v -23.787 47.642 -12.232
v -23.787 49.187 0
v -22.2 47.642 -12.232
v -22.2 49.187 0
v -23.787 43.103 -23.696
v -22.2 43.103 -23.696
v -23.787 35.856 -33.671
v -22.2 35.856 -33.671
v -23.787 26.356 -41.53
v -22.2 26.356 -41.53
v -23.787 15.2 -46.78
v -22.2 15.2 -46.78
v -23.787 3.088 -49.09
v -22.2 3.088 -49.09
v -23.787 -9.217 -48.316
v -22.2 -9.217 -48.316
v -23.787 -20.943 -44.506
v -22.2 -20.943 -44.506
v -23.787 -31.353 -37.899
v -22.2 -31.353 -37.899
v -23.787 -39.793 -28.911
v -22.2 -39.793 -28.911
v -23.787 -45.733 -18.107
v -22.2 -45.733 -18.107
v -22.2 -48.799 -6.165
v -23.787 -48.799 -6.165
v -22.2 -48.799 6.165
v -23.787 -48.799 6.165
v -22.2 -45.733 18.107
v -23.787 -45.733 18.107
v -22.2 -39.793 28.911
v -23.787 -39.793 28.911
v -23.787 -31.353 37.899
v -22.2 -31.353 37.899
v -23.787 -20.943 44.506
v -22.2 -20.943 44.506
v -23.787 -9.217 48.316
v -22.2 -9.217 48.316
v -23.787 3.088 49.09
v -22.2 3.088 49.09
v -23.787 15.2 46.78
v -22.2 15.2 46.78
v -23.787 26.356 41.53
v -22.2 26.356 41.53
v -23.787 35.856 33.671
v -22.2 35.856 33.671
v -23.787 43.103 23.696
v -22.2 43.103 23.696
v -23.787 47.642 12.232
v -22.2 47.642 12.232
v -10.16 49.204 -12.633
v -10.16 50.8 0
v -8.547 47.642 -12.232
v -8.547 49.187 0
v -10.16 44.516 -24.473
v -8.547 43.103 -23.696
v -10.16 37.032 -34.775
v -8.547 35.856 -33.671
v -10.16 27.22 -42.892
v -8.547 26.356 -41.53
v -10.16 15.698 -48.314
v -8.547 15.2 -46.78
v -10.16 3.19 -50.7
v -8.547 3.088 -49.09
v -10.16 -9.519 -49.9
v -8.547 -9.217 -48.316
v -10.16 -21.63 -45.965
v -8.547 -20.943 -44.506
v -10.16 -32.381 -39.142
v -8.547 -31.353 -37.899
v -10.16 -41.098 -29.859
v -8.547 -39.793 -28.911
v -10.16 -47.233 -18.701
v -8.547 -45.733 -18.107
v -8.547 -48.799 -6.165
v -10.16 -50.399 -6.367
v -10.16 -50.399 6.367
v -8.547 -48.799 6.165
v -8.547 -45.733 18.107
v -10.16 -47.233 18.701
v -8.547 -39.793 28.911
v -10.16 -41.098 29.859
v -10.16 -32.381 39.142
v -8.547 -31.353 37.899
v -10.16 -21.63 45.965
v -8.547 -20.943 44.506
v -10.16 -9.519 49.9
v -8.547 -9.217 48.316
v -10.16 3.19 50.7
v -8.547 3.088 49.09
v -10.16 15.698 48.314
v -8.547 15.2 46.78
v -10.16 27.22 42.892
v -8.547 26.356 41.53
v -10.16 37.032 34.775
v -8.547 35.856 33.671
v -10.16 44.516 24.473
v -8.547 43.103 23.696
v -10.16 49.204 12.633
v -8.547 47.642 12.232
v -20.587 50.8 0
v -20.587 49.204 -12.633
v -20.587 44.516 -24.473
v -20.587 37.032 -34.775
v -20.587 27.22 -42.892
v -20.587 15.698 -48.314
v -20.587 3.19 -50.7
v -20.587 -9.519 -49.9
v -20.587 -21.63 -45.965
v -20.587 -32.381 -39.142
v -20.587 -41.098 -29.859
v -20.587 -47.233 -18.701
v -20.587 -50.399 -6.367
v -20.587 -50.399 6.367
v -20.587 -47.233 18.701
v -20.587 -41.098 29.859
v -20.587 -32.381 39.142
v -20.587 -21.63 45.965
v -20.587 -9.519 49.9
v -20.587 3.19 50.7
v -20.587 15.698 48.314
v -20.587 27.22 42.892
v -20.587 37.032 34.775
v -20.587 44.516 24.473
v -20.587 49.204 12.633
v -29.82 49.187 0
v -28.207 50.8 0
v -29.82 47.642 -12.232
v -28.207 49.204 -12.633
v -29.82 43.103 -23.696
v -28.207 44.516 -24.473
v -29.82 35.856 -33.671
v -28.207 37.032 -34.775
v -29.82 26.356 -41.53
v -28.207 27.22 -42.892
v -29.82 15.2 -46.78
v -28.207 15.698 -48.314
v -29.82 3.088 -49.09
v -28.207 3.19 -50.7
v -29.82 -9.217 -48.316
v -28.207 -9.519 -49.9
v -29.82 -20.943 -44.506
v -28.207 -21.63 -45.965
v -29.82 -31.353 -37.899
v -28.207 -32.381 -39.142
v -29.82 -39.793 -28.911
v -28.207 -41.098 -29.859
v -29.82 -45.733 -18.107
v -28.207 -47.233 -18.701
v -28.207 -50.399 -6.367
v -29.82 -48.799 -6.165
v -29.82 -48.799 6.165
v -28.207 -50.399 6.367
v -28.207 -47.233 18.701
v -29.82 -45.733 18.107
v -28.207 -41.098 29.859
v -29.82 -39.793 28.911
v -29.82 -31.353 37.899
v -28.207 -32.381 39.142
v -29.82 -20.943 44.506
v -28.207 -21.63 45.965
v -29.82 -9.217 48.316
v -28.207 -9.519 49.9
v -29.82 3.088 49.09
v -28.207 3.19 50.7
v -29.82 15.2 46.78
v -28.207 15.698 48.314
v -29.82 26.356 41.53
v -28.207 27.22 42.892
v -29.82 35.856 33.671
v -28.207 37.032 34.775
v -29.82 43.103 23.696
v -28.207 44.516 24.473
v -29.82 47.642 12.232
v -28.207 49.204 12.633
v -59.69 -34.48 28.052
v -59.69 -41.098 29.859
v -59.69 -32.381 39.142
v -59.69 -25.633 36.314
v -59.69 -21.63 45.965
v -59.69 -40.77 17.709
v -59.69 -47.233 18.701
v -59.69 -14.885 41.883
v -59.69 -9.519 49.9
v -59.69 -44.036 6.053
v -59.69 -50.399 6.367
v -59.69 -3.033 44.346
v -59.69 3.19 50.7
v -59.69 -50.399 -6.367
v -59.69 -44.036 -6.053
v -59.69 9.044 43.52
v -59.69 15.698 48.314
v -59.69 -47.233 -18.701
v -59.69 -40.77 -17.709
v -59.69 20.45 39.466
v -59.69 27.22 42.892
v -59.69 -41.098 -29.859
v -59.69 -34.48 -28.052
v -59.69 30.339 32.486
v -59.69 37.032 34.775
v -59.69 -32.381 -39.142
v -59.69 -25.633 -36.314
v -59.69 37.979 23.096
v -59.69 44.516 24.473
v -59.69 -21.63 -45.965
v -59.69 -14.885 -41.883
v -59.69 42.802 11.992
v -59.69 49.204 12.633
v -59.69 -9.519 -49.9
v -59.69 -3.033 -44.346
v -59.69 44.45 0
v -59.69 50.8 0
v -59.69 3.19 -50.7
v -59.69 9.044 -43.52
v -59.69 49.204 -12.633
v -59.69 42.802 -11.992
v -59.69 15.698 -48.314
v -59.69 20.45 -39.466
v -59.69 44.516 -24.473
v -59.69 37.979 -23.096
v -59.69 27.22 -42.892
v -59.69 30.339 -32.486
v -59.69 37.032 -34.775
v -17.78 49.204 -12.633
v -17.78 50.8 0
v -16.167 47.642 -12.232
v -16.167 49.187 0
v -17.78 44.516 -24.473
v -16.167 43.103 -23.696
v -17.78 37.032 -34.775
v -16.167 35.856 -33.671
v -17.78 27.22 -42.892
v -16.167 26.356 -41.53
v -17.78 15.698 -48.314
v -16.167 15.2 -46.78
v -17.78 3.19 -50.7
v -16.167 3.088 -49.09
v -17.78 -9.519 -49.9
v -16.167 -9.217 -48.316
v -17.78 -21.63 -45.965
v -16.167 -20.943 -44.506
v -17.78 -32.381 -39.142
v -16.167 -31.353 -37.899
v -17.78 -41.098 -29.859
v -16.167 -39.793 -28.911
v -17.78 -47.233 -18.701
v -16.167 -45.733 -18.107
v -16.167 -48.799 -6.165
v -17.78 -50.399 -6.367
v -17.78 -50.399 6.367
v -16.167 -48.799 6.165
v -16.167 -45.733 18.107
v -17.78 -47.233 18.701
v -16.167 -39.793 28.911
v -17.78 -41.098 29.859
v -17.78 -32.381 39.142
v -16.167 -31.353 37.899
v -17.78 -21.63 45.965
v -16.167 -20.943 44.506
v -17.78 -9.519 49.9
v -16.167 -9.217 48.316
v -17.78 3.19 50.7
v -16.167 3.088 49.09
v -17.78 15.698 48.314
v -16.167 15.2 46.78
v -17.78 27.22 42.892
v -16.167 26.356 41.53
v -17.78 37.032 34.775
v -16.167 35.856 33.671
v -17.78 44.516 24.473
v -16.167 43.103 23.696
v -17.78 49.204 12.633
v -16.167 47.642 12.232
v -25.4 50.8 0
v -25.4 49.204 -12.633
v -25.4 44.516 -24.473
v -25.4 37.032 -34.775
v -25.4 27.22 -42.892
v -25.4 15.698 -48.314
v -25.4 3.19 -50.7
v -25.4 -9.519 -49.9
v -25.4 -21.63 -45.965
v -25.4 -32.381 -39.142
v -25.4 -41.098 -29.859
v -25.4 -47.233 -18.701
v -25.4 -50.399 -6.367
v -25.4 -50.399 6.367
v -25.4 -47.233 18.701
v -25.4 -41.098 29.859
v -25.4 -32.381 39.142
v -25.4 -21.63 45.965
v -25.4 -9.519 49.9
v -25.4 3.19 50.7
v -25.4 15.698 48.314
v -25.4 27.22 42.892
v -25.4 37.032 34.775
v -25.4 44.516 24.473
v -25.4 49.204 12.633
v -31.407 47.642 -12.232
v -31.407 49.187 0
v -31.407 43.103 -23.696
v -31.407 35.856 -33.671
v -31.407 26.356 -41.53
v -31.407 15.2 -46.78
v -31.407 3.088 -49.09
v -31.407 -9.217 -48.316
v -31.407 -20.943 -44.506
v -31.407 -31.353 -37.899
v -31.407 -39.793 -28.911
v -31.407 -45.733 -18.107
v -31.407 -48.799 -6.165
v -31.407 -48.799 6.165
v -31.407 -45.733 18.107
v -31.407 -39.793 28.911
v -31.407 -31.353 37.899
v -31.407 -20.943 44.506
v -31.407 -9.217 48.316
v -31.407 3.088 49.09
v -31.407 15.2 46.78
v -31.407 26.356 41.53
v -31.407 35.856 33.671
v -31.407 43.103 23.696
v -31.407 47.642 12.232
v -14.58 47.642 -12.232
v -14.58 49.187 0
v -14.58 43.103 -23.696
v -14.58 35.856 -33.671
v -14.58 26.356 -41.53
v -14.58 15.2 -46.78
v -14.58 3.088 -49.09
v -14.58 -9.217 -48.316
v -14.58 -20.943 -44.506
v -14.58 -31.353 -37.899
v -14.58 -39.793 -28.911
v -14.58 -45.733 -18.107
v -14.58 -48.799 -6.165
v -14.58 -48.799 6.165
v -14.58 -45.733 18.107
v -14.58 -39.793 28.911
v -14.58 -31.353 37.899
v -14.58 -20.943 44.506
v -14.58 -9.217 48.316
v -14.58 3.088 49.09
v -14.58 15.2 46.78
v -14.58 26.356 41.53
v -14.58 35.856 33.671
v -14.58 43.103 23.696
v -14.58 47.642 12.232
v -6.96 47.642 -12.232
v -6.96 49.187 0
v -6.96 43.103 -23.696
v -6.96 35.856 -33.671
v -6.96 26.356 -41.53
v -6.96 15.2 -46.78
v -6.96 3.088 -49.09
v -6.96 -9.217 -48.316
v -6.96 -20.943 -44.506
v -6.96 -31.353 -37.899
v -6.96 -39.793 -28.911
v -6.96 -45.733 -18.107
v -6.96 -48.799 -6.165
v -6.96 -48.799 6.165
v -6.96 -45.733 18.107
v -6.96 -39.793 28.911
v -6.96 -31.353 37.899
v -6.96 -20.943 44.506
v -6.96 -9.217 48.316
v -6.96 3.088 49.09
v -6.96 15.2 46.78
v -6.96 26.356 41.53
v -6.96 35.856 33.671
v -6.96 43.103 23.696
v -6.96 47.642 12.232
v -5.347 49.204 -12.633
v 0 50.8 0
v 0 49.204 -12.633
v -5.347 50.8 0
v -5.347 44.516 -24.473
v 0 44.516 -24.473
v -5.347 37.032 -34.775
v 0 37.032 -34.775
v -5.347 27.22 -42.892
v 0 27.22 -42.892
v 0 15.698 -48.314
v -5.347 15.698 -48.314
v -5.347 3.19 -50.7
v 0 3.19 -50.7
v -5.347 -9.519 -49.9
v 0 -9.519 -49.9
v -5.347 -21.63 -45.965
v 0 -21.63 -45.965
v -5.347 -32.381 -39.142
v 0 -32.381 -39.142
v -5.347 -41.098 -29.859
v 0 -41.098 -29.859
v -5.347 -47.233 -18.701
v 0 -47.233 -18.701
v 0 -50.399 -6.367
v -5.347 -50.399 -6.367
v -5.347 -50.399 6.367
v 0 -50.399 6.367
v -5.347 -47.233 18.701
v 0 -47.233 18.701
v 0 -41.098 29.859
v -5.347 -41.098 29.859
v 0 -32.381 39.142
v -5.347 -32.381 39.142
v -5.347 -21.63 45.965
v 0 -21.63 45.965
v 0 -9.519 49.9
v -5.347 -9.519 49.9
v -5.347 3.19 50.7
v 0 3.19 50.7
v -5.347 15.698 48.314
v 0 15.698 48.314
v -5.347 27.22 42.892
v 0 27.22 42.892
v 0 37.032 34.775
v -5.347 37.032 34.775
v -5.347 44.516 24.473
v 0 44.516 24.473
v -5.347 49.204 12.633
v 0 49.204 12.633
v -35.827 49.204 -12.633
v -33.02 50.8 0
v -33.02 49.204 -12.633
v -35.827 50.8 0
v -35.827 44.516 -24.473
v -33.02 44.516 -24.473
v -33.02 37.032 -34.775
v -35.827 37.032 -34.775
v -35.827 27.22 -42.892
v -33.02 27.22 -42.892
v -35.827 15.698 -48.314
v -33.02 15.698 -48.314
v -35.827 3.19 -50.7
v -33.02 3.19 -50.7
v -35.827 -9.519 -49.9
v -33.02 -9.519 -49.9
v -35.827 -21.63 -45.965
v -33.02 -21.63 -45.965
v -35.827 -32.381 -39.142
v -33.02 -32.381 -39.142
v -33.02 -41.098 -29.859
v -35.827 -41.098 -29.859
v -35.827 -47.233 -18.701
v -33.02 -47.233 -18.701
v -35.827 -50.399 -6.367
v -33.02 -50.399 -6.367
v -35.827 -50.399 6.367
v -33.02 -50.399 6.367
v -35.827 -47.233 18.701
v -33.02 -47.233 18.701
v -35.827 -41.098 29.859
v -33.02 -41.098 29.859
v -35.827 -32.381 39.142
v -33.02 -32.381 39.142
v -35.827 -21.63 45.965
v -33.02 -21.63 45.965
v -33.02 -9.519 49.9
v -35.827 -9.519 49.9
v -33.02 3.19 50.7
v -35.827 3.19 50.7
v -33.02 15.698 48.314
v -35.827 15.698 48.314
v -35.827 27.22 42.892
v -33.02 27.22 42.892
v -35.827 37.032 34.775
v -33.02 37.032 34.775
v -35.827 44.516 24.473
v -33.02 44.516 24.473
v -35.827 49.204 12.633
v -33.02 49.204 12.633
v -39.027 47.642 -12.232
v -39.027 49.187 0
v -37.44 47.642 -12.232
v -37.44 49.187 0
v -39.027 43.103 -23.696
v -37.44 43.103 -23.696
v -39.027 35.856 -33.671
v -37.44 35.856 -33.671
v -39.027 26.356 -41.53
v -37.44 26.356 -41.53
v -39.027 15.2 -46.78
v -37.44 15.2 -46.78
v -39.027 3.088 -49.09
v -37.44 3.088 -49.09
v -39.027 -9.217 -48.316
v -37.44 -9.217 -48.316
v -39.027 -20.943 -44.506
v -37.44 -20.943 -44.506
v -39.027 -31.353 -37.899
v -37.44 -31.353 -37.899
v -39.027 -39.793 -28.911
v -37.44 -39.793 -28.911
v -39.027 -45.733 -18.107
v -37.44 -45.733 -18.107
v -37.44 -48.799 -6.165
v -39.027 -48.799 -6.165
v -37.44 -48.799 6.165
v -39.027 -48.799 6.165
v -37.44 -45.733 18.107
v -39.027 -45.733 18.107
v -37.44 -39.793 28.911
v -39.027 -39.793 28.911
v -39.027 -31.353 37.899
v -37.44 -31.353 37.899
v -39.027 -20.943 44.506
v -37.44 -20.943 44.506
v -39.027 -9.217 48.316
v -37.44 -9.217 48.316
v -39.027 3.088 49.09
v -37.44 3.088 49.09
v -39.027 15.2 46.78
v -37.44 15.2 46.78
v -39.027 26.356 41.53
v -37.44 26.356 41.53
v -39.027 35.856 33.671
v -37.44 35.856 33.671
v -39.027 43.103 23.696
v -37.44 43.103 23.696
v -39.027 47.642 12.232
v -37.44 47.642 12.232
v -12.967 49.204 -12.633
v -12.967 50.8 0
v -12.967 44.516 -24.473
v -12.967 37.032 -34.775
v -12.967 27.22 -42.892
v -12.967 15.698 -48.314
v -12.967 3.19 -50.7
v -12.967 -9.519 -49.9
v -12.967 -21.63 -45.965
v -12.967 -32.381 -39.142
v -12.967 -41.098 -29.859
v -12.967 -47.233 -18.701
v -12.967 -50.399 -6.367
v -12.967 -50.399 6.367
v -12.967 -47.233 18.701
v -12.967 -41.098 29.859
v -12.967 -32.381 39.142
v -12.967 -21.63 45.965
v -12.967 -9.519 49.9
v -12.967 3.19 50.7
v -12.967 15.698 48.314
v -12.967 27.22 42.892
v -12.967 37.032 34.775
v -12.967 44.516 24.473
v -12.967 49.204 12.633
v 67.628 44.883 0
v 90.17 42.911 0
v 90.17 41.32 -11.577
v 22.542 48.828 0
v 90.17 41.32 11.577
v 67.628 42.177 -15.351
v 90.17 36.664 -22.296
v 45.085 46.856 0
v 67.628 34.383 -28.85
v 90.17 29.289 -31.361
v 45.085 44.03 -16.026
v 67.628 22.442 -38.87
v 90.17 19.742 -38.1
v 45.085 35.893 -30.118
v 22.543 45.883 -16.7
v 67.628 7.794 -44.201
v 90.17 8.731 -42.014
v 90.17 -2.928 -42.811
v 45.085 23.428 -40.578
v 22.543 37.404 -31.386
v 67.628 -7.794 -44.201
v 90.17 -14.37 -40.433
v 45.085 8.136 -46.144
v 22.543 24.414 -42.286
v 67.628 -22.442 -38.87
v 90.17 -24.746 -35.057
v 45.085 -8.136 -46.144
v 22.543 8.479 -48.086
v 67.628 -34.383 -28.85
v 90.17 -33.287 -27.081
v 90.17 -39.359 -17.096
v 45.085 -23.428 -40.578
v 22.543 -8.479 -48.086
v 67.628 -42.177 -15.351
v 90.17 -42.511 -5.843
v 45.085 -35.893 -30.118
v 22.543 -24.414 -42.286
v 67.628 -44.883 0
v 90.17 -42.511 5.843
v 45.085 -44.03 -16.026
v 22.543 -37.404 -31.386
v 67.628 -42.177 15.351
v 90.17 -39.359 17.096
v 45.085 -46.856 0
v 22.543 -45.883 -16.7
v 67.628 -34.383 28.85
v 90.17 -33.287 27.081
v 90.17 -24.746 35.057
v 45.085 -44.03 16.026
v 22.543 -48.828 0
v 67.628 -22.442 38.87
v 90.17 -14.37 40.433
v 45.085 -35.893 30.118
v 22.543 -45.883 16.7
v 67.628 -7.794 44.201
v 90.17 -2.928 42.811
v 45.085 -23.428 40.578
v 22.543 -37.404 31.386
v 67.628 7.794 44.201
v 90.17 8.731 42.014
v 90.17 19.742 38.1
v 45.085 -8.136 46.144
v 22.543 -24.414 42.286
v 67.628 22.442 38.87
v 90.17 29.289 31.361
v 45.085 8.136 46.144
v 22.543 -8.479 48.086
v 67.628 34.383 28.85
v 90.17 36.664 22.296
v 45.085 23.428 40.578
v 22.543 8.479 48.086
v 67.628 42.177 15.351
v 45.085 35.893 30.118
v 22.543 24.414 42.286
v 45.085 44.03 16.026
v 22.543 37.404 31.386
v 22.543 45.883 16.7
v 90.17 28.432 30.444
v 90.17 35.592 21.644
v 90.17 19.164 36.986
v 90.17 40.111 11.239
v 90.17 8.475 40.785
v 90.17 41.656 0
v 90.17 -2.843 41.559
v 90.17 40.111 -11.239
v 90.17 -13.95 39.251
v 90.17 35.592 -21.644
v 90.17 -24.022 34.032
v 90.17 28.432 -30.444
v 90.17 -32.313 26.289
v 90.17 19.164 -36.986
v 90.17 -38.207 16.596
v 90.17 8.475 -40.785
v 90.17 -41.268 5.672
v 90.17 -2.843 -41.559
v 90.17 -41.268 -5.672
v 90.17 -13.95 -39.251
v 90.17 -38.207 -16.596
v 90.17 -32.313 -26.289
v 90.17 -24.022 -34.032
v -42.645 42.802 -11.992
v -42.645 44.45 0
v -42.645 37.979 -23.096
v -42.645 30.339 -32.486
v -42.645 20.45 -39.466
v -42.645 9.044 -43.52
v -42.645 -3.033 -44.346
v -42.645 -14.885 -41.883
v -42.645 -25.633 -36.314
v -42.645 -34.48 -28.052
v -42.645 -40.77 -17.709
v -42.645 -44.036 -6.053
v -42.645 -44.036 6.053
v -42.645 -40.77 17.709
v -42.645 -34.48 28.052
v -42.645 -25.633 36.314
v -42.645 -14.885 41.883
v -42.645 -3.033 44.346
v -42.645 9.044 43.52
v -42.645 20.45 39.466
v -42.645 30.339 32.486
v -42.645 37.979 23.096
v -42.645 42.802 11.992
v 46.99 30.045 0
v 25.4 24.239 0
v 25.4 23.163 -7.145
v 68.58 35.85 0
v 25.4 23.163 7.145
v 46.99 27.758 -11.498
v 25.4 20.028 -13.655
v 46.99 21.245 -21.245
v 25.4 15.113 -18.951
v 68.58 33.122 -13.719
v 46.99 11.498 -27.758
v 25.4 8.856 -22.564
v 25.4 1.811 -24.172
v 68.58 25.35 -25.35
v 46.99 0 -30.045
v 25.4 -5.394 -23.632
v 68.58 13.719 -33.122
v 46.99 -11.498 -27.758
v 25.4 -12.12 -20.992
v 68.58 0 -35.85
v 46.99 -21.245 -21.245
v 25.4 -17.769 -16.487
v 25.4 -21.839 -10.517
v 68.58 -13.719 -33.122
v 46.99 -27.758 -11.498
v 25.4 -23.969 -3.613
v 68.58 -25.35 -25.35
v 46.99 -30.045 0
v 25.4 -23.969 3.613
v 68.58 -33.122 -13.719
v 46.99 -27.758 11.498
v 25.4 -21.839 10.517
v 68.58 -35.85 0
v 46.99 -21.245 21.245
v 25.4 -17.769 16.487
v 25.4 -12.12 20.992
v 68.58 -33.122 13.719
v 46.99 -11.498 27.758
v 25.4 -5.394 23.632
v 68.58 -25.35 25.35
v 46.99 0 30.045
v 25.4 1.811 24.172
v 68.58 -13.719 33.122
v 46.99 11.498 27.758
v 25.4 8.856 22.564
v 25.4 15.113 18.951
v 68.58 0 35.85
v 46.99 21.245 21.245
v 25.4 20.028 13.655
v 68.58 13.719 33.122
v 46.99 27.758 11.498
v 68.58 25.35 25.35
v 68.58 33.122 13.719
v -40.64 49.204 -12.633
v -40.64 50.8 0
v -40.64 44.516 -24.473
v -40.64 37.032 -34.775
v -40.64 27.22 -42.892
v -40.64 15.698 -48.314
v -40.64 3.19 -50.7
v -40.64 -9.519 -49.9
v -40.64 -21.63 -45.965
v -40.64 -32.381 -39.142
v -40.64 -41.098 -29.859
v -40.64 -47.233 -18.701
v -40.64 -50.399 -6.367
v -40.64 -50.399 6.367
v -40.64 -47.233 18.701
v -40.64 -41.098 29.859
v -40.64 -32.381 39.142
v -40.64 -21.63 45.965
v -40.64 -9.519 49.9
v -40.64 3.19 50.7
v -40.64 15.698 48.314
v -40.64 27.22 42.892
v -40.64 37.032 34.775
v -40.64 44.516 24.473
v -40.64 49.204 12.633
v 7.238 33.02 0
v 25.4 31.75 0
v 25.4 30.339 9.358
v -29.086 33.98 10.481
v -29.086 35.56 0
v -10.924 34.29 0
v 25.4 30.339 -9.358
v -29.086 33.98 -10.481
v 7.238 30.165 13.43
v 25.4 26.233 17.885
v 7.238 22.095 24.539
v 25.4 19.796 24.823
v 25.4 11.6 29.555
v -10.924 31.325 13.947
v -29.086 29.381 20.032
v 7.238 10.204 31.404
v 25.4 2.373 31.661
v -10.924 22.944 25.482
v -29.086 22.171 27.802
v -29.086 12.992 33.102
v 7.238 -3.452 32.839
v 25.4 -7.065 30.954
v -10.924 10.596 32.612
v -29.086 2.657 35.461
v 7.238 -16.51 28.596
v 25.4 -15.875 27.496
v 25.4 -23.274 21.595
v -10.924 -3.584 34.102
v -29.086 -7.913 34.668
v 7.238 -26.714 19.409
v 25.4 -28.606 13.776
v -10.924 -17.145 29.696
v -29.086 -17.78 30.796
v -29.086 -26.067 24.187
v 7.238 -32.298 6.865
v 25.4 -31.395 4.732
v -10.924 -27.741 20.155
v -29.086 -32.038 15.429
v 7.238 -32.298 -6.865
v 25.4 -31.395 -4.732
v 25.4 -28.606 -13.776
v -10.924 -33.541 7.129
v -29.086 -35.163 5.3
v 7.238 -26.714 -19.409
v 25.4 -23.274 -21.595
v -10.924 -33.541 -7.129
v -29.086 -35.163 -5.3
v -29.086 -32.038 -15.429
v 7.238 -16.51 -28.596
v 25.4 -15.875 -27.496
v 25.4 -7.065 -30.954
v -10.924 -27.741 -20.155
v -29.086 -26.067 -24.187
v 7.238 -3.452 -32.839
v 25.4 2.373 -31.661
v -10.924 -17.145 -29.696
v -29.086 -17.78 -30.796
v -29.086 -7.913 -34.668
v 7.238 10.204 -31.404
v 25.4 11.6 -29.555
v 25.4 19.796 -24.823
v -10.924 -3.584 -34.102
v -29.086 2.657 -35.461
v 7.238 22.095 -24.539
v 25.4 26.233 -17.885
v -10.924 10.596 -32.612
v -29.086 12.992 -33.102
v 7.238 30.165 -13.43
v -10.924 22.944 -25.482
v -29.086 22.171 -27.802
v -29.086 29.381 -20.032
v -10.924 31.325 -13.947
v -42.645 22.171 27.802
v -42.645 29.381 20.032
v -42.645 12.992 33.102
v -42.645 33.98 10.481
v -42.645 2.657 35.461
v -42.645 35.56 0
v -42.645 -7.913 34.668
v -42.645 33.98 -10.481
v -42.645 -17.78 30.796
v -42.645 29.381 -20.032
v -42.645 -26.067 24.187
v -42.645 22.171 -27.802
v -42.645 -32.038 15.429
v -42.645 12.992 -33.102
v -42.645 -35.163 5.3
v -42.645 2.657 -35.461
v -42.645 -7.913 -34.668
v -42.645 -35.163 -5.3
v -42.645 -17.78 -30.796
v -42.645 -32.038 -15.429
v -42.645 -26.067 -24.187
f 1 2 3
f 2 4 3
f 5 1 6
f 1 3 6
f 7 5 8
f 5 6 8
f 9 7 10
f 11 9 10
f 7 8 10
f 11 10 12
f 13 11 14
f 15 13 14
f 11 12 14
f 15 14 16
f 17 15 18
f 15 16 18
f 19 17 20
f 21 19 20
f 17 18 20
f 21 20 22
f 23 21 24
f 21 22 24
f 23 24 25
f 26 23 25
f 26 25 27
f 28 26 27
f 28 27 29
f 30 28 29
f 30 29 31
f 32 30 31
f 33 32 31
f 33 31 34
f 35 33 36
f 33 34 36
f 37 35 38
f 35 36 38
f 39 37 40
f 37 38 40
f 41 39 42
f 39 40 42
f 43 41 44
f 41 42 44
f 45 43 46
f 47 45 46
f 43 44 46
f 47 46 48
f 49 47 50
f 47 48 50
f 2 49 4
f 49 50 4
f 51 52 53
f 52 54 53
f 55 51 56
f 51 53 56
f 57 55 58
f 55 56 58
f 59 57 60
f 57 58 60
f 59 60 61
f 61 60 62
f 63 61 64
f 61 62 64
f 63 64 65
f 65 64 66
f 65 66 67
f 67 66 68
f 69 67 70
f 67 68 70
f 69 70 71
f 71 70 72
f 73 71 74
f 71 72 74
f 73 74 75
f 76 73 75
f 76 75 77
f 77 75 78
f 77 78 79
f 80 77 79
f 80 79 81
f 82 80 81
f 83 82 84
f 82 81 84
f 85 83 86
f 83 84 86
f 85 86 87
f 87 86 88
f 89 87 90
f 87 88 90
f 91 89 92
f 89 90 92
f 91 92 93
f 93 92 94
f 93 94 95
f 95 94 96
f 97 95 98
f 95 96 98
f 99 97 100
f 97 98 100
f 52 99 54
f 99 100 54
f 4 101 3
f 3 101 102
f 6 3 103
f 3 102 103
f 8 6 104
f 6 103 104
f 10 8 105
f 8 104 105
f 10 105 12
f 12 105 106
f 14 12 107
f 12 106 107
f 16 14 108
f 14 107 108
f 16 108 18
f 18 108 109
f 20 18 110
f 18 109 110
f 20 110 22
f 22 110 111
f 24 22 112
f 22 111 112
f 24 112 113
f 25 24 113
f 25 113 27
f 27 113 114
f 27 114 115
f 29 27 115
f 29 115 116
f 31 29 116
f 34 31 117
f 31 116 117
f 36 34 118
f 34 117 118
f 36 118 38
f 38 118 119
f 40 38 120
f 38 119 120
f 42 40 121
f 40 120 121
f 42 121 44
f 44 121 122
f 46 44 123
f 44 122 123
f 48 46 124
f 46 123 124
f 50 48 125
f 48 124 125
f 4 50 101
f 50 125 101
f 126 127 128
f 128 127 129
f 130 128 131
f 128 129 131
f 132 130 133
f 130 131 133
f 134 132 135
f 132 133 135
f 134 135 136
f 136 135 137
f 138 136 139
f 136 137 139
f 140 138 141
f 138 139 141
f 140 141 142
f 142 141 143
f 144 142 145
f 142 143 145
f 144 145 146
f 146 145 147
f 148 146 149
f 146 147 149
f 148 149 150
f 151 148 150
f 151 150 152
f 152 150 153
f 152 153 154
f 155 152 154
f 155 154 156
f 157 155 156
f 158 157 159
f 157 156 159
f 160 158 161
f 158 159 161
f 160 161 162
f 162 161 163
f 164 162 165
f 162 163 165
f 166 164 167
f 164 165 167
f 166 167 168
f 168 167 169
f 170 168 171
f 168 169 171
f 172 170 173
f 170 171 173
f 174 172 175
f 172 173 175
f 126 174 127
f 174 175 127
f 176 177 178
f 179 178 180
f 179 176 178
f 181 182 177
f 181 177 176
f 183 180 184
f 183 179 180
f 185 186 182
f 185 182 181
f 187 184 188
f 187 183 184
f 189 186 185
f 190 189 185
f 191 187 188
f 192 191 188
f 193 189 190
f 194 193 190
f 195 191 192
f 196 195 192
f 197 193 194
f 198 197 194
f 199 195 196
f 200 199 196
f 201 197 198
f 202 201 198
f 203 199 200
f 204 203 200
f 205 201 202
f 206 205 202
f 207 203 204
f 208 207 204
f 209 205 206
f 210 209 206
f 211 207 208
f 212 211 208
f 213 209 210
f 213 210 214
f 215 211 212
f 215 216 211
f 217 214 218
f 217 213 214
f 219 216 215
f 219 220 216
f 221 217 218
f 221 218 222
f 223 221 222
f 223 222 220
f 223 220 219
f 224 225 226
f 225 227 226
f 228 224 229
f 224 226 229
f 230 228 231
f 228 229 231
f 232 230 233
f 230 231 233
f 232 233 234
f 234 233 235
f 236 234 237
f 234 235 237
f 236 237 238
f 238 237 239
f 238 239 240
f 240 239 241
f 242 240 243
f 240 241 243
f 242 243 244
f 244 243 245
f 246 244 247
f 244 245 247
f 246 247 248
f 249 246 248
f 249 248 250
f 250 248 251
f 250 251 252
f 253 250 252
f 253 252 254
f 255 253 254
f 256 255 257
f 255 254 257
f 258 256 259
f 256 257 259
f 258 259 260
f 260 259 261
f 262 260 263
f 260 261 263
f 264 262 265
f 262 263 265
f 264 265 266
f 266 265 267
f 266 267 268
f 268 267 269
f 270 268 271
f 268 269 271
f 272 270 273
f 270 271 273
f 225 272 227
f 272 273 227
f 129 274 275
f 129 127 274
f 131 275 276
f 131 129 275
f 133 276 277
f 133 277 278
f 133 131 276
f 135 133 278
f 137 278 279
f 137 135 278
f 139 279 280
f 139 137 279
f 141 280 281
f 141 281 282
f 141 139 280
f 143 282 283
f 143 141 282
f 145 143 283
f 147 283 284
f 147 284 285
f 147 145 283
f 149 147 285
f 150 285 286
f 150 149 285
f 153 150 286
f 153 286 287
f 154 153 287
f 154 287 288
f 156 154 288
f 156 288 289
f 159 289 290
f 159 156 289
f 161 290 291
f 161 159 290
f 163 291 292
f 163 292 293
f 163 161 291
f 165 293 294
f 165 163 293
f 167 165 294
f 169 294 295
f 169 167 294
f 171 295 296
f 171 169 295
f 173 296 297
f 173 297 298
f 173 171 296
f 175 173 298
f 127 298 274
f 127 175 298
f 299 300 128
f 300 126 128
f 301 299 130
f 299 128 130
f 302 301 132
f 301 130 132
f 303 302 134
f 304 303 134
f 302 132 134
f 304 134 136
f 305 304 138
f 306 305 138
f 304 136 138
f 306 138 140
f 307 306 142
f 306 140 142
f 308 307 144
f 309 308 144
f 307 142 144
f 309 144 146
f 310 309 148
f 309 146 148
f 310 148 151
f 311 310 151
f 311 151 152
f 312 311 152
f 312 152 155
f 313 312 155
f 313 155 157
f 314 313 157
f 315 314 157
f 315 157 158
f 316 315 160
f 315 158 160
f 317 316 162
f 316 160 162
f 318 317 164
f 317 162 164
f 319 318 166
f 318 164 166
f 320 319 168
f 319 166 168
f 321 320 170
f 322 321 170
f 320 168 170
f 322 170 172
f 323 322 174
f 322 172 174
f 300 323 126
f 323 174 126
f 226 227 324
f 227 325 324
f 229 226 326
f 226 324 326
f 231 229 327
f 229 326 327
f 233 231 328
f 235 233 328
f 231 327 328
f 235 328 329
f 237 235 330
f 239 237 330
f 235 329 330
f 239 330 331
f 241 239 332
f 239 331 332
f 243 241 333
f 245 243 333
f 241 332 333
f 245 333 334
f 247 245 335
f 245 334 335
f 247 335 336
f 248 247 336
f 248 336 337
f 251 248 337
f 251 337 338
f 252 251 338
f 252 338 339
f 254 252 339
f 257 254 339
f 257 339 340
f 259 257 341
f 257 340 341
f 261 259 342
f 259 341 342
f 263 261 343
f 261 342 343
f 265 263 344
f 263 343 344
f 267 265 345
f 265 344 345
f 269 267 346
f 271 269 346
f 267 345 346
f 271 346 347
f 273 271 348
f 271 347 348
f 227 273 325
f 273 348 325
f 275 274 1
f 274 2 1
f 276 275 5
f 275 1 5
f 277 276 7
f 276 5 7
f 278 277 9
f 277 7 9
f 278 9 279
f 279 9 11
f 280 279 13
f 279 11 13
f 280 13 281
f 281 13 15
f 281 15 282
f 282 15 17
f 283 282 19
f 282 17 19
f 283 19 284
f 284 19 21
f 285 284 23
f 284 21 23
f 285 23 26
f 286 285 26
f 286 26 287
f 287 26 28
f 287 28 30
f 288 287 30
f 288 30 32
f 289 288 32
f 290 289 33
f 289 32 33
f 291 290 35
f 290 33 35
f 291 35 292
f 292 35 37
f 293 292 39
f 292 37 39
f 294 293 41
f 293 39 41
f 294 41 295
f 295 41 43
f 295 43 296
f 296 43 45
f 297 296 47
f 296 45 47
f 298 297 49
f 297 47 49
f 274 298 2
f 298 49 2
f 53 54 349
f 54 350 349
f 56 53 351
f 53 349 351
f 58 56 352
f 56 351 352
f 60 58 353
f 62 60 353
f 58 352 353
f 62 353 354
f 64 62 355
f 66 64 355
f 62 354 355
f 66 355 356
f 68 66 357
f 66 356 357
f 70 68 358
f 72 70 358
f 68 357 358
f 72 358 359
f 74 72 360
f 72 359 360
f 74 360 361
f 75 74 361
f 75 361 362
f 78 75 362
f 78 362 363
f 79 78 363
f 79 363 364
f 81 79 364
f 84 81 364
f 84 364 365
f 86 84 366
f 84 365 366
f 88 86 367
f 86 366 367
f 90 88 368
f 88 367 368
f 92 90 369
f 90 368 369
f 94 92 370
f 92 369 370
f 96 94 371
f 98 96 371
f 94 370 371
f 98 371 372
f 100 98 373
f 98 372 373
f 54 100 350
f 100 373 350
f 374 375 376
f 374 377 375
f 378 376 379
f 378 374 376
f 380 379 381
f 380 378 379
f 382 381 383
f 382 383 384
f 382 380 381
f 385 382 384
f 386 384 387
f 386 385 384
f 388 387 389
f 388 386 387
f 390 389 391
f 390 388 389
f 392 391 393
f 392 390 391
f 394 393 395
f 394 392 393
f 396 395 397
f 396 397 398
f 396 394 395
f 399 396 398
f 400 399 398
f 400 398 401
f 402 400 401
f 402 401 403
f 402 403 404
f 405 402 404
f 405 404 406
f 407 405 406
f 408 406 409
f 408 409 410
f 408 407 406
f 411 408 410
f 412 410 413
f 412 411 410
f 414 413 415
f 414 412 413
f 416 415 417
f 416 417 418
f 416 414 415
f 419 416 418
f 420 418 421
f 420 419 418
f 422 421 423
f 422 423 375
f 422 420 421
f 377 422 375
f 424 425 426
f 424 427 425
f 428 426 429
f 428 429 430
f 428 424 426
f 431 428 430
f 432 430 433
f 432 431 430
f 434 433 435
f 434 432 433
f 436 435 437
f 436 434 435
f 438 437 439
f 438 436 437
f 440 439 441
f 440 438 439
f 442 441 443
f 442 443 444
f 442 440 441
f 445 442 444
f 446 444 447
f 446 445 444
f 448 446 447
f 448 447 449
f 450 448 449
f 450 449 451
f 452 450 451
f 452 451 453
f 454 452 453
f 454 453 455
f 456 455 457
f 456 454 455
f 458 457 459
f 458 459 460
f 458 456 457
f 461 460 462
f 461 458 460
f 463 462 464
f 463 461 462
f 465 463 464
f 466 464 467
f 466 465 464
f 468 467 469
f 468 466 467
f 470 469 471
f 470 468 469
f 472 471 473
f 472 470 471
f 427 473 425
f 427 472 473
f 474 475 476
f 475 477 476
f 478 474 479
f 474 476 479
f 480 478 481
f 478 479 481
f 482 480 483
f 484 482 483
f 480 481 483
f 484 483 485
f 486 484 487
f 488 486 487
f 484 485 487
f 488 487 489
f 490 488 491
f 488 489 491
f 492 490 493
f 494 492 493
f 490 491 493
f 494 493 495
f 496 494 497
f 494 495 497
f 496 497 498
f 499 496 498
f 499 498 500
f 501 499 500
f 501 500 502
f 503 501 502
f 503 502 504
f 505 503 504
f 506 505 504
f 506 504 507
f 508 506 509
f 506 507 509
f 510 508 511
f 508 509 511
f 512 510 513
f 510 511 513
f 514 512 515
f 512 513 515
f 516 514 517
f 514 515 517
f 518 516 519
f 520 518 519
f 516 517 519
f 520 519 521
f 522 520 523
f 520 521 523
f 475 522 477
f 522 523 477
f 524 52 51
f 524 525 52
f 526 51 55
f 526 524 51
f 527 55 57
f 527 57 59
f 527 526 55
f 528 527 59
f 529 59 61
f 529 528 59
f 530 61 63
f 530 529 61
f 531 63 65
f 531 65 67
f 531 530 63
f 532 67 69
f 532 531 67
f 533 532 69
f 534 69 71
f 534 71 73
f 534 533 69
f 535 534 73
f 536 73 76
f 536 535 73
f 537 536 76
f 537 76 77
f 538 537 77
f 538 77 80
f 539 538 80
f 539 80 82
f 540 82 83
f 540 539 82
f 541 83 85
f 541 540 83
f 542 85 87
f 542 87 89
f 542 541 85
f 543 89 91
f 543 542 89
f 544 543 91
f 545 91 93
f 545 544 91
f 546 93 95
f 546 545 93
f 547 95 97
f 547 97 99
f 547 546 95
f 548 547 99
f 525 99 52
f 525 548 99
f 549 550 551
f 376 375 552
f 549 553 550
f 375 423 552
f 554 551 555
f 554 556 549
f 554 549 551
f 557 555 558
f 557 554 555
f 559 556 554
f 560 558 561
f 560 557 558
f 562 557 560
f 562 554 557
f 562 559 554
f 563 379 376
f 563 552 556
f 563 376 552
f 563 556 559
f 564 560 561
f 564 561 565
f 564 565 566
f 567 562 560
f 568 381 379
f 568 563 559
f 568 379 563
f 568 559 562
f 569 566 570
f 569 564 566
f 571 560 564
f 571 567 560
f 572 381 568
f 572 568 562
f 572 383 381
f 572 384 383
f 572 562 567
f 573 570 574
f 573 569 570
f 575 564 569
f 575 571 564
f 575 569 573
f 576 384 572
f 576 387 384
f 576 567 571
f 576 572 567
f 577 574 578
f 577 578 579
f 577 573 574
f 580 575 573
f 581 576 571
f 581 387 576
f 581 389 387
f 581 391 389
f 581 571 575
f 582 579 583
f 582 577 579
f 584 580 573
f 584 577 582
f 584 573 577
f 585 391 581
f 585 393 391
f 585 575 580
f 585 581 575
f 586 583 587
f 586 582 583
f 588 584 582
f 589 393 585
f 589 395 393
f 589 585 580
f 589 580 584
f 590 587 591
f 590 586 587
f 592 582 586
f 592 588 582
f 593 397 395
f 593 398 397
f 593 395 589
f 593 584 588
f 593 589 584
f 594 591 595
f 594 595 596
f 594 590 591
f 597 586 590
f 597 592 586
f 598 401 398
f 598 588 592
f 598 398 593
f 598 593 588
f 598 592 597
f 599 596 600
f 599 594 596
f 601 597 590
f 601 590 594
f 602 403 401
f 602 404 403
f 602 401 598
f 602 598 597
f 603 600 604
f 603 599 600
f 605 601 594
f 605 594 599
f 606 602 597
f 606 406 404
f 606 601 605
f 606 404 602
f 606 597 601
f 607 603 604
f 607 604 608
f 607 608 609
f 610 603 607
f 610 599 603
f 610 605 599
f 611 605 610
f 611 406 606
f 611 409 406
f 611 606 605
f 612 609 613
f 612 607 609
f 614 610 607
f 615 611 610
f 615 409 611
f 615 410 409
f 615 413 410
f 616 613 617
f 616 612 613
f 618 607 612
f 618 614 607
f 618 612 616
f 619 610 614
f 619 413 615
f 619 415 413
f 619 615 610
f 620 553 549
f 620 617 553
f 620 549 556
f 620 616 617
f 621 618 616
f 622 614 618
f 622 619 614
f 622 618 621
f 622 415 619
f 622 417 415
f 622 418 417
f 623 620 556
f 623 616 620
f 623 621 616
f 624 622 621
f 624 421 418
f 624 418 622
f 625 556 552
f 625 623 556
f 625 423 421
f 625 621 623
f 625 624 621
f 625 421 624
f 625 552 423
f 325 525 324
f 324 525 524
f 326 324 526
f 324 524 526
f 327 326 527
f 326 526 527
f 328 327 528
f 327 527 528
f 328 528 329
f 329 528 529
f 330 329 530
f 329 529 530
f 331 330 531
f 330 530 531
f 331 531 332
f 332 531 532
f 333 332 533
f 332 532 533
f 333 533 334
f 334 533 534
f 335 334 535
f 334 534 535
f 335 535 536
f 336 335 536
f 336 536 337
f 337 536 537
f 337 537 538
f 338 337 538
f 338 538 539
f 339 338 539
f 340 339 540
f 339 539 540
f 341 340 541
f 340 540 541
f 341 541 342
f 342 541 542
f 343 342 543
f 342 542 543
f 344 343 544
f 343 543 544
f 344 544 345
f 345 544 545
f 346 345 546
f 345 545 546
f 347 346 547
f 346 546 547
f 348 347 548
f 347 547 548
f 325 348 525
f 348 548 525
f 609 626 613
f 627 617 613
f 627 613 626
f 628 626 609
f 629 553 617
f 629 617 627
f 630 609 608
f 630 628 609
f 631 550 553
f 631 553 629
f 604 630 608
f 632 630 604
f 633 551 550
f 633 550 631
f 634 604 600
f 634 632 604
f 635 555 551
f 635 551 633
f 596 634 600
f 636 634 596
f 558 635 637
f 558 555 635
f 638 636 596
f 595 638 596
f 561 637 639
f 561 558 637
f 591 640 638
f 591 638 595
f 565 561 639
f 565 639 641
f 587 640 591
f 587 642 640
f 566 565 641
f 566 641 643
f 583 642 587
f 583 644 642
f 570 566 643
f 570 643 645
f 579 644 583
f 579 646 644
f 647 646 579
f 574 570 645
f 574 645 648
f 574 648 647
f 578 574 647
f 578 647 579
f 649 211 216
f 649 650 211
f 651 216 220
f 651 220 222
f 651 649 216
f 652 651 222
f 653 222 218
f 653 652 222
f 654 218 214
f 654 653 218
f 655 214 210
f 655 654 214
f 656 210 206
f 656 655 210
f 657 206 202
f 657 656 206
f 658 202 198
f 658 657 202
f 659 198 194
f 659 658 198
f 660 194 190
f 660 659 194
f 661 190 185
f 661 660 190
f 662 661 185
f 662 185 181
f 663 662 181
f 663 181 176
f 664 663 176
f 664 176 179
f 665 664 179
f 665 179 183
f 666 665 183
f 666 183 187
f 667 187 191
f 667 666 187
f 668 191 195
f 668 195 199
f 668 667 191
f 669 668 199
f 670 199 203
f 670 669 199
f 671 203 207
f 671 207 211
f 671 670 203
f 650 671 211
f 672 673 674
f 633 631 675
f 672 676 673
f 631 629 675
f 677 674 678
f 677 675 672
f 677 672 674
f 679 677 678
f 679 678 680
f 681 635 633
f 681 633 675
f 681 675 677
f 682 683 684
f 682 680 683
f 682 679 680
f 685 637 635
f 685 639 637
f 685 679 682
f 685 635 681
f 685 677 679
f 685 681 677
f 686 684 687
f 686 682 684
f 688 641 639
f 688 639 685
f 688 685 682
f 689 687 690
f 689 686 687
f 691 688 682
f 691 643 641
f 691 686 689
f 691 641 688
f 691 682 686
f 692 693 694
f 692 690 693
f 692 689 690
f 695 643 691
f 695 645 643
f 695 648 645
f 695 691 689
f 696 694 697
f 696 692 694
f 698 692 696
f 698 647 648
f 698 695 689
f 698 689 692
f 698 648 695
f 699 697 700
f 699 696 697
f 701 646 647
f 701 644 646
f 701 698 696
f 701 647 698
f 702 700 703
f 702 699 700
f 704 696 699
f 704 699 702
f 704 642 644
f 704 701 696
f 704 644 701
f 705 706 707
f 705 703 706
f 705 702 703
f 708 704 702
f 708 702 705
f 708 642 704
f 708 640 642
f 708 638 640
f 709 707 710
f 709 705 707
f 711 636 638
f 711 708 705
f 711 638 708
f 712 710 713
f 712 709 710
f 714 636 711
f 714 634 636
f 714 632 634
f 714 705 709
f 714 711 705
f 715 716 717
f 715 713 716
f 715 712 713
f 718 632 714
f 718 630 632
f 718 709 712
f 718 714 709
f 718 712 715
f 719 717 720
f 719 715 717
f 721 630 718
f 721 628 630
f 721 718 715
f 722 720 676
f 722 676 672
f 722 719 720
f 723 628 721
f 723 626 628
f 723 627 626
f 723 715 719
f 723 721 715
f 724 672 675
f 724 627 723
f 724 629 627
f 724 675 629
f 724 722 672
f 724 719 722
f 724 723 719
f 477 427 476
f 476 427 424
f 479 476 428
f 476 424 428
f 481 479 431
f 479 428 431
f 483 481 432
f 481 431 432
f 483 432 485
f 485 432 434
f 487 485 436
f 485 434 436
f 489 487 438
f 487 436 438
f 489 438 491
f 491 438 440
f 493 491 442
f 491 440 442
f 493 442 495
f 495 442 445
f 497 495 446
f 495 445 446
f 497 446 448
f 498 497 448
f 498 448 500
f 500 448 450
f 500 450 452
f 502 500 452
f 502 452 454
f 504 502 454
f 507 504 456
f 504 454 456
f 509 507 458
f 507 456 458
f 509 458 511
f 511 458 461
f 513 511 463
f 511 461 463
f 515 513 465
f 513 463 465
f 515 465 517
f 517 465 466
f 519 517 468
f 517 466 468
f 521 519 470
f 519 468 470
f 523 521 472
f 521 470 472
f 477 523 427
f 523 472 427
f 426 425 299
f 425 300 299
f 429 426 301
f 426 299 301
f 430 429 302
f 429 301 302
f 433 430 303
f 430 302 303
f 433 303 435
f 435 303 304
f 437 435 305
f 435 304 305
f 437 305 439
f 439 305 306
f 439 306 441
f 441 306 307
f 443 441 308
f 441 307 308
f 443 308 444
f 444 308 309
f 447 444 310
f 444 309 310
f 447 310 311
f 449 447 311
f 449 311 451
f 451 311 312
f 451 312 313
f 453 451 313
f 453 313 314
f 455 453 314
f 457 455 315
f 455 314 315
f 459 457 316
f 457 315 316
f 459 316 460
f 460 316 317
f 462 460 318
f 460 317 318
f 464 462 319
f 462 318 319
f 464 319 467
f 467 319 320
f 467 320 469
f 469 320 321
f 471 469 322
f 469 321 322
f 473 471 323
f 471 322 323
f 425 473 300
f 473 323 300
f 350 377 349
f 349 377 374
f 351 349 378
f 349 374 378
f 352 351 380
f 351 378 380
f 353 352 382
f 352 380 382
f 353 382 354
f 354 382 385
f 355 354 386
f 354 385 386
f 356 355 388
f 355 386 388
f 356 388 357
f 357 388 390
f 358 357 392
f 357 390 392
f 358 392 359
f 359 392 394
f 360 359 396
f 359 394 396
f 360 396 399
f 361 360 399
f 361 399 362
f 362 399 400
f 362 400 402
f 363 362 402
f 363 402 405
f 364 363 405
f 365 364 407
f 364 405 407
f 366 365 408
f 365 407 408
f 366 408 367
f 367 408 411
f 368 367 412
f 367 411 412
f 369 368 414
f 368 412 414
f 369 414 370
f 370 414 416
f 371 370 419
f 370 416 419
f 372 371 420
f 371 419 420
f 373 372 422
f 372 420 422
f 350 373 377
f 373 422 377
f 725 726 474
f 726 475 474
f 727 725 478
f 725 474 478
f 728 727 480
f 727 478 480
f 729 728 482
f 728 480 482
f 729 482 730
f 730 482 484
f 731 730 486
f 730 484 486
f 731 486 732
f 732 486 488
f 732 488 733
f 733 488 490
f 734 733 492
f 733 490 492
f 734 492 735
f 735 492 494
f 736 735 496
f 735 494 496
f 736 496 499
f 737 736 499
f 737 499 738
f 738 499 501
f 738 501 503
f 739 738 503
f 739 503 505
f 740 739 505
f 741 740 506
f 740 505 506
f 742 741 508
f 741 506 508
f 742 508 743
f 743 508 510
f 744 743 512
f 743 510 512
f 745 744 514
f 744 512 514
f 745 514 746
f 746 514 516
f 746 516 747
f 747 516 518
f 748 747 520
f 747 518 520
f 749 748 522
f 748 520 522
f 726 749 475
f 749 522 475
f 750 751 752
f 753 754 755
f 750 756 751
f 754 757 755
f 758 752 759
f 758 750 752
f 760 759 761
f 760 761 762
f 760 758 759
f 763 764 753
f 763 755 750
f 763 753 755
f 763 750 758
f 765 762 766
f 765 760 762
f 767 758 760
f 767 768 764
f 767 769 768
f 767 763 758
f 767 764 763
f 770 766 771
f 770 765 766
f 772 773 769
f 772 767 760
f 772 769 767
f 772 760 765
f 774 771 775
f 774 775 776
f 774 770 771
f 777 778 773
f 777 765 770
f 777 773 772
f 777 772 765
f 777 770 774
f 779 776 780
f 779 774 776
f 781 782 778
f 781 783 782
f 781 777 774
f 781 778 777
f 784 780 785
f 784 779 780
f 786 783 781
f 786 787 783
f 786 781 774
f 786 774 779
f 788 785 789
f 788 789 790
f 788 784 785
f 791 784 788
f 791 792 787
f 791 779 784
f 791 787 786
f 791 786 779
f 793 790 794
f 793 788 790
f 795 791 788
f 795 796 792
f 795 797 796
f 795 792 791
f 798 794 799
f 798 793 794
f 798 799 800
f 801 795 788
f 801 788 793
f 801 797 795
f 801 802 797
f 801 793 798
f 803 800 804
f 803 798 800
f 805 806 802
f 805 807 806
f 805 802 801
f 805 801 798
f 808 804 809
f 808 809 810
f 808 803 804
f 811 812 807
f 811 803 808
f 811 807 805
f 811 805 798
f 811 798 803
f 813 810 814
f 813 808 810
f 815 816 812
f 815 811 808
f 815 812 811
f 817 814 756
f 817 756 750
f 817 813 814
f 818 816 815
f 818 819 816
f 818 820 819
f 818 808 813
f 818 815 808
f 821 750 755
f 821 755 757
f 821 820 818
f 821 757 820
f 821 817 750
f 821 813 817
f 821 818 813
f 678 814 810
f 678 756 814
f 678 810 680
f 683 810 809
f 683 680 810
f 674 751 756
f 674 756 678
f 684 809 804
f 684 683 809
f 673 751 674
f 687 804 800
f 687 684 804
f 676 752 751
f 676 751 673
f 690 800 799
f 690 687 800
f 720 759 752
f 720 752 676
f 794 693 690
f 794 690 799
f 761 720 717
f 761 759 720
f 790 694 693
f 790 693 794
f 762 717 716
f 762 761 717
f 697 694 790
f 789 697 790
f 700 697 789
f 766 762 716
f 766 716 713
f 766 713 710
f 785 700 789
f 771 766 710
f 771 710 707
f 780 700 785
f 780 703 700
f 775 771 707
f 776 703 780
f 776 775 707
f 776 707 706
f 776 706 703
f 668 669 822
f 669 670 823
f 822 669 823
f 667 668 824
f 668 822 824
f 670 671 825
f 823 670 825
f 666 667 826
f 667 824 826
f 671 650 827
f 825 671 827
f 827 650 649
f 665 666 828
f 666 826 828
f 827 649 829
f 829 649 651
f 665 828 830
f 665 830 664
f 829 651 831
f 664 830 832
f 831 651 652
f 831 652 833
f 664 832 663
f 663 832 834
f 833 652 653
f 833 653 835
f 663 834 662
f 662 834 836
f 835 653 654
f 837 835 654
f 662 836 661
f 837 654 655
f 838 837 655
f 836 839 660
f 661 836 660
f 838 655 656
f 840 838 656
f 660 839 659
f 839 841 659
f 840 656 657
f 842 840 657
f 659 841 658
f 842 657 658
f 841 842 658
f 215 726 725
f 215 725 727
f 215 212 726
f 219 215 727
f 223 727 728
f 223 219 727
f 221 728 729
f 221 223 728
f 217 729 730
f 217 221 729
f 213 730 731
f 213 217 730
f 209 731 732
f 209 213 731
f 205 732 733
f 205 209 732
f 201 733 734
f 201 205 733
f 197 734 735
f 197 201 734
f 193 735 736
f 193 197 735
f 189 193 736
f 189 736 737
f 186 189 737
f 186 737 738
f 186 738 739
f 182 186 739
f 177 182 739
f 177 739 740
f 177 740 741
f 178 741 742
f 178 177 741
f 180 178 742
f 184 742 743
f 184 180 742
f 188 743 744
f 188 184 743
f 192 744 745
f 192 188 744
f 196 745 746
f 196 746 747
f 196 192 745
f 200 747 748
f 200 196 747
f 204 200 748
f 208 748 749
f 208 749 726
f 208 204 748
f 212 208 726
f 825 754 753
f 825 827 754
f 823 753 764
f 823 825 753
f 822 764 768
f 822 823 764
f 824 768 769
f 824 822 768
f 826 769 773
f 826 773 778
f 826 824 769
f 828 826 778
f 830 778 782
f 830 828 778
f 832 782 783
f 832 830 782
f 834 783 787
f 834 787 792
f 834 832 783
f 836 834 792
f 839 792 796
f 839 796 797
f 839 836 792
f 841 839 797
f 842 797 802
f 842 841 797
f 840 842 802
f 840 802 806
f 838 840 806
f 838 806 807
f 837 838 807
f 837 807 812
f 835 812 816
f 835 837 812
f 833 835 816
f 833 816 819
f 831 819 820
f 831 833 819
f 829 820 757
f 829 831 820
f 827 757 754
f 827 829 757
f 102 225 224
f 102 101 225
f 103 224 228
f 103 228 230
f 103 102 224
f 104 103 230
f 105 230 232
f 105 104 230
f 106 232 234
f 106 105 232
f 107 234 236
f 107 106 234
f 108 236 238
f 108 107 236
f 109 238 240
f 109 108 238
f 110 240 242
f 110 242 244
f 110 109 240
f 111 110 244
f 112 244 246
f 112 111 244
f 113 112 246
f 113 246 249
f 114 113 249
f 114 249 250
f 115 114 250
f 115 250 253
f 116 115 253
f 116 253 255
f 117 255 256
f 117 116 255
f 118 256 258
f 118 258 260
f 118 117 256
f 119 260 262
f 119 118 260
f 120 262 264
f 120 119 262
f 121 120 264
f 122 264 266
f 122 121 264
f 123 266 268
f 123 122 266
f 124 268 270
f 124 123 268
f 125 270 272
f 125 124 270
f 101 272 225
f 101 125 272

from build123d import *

# Parameters (mm, degrees)
SKETCH4_W       = 29.744523245
SKETCH4_H       = 12.7
SKETCH5_W       = 1.5875
SKETCH5_H       = 1.6129
LPATTERN1_COUNT = 5
LPATTERN1_PITCH = 7.62


with BuildPart() as part:
    # Sketch1 → Revolve1 (revolve)
    with BuildSketch(Plane.XY):
        with BuildLine():
            ThreePointArc((0, 17.653), (0.898160183, 17.712068298), (1.780848569, 17.888255676))
            Line((1.780848569, 17.888255676), (90.17, 41.656))
            Line((90.17, 41.656), (90.17, 42.91114721))
            Line((90.17, 42.91114721), (0, 50.8))
            Line((0, 50.8), (-59.69, 50.8))
            Line((-59.69, 50.8), (-59.69, 44.45))
            Line((-59.69, 44.45), (-72.39, 44.45))
            Line((-72.39, 44.45), (-72.39, 38.1))
            Line((-72.39, 38.1), (-59.69, 38.1))
            Line((-59.69, 38.1), (-9.310840107, 19.331058169))
            ThreePointArc((-9.310840107, 19.331058169), (-4.730423414, 18.075866931), (0, 17.653))
        make_face()
    revolve(axis=Axis((0, 0, 0), (-1, 0, 0)))

    # Sketch2 → Cut-Revolve2 (revolve, cut)
    with BuildSketch(Plane.XY):
        Polygon((25.4, 31.75), (0, 31.75), (-42.645476755, 31.75), (-50.8, 31.75), (-50.8, 0), (0, 0), (25.4, 0), align=None)
        Polygon((-42.645476755, 31.75), (0, 31.75), (25.4, 31.75), (-29.085538438, 35.56), (-42.645476755, 35.56), align=None)
    revolve(axis=Axis((-50.8, 0, 0), (1, 0, 0)), mode=Mode.SUBTRACT)

    # Sketch4 → Cut-Revolve4 (revolve, cut)
    with BuildSketch(Plane.XY):
        with Locations((-57.517738378, 38.1)):
            Rectangle(SKETCH4_W, SKETCH4_H)
    revolve(axis=Axis((0, 0, 0), (-1, 0, 0)), mode=Mode.SUBTRACT)

    # Sketch5 → Cut-Revolve5 (revolve, cut)
    with BuildSketch(Plane.XY):
        Polygon((-37.4396, 50.8), (-37.4396, 49.1871), (-35.8267, 50.8), align=None)
        with Locations((-38.23335, 49.99355)):
            Rectangle(SKETCH5_W, SKETCH5_H)
        Polygon((-40.64, 50.8), (-39.0271, 49.1871), (-39.0271, 50.8), align=None)
    cut_revolve5 = revolve(axis=Axis((0, 0, 0), (-1, 0, 0)), mode=Mode.SUBTRACT)

    # LPattern1: Cut-Revolve5 ×5
    with Locations(*[(i * LPATTERN1_PITCH, 0, 0) for i in range(1, LPATTERN1_COUNT)]):
        add(cut_revolve5, mode=Mode.SUBTRACT)


solid = part.part
